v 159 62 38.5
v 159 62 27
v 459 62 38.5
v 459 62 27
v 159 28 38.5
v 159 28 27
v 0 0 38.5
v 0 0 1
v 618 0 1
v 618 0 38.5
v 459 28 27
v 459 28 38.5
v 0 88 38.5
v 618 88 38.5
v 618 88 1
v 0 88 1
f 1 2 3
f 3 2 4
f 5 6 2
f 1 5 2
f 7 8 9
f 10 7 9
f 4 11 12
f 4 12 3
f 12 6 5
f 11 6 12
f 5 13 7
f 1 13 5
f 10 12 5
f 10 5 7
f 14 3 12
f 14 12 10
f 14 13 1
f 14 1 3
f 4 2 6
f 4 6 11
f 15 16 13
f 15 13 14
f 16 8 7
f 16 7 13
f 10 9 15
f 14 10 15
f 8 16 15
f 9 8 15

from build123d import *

# Parameters (mm, degrees)
CEK_DONMUS_ON_PU_37_5_1_START = 1
SKETCH1_W                     = 618
SKETCH1_H                     = 88
CEK_DONMUS_ON_PU_37_5_1_DEPTH = 37.5
CEK_DONMUS_ON_PU_37_5_2_START = 27
SKETCH2_W                     = 300
SKETCH2_H                     = 34
CEK_DONMUS_ON_PU_37_5_2_DEPTH = 14


with BuildPart() as part:
    # Sketch1 → CEK_donmus_on_pu_37.5_1 (new body)
    with BuildSketch(Plane.XY.offset(CEK_DONMUS_ON_PU_37_5_1_START)):
        with Locations((309, 44)):
            Rectangle(SKETCH1_W, SKETCH1_H)
    extrude(amount=CEK_DONMUS_ON_PU_37_5_1_DEPTH)

    # Sketch2 → CEK_donmus_on_pu_37.5_2 (cut)
    with BuildSketch(Plane.XY.offset(CEK_DONMUS_ON_PU_37_5_2_START)):
        with Locations((309, 45)):
            Rectangle(SKETCH2_W, SKETCH2_H)
    extrude(amount=CEK_DONMUS_ON_PU_37_5_2_DEPTH, mode=Mode.SUBTRACT)


solid = part.part
